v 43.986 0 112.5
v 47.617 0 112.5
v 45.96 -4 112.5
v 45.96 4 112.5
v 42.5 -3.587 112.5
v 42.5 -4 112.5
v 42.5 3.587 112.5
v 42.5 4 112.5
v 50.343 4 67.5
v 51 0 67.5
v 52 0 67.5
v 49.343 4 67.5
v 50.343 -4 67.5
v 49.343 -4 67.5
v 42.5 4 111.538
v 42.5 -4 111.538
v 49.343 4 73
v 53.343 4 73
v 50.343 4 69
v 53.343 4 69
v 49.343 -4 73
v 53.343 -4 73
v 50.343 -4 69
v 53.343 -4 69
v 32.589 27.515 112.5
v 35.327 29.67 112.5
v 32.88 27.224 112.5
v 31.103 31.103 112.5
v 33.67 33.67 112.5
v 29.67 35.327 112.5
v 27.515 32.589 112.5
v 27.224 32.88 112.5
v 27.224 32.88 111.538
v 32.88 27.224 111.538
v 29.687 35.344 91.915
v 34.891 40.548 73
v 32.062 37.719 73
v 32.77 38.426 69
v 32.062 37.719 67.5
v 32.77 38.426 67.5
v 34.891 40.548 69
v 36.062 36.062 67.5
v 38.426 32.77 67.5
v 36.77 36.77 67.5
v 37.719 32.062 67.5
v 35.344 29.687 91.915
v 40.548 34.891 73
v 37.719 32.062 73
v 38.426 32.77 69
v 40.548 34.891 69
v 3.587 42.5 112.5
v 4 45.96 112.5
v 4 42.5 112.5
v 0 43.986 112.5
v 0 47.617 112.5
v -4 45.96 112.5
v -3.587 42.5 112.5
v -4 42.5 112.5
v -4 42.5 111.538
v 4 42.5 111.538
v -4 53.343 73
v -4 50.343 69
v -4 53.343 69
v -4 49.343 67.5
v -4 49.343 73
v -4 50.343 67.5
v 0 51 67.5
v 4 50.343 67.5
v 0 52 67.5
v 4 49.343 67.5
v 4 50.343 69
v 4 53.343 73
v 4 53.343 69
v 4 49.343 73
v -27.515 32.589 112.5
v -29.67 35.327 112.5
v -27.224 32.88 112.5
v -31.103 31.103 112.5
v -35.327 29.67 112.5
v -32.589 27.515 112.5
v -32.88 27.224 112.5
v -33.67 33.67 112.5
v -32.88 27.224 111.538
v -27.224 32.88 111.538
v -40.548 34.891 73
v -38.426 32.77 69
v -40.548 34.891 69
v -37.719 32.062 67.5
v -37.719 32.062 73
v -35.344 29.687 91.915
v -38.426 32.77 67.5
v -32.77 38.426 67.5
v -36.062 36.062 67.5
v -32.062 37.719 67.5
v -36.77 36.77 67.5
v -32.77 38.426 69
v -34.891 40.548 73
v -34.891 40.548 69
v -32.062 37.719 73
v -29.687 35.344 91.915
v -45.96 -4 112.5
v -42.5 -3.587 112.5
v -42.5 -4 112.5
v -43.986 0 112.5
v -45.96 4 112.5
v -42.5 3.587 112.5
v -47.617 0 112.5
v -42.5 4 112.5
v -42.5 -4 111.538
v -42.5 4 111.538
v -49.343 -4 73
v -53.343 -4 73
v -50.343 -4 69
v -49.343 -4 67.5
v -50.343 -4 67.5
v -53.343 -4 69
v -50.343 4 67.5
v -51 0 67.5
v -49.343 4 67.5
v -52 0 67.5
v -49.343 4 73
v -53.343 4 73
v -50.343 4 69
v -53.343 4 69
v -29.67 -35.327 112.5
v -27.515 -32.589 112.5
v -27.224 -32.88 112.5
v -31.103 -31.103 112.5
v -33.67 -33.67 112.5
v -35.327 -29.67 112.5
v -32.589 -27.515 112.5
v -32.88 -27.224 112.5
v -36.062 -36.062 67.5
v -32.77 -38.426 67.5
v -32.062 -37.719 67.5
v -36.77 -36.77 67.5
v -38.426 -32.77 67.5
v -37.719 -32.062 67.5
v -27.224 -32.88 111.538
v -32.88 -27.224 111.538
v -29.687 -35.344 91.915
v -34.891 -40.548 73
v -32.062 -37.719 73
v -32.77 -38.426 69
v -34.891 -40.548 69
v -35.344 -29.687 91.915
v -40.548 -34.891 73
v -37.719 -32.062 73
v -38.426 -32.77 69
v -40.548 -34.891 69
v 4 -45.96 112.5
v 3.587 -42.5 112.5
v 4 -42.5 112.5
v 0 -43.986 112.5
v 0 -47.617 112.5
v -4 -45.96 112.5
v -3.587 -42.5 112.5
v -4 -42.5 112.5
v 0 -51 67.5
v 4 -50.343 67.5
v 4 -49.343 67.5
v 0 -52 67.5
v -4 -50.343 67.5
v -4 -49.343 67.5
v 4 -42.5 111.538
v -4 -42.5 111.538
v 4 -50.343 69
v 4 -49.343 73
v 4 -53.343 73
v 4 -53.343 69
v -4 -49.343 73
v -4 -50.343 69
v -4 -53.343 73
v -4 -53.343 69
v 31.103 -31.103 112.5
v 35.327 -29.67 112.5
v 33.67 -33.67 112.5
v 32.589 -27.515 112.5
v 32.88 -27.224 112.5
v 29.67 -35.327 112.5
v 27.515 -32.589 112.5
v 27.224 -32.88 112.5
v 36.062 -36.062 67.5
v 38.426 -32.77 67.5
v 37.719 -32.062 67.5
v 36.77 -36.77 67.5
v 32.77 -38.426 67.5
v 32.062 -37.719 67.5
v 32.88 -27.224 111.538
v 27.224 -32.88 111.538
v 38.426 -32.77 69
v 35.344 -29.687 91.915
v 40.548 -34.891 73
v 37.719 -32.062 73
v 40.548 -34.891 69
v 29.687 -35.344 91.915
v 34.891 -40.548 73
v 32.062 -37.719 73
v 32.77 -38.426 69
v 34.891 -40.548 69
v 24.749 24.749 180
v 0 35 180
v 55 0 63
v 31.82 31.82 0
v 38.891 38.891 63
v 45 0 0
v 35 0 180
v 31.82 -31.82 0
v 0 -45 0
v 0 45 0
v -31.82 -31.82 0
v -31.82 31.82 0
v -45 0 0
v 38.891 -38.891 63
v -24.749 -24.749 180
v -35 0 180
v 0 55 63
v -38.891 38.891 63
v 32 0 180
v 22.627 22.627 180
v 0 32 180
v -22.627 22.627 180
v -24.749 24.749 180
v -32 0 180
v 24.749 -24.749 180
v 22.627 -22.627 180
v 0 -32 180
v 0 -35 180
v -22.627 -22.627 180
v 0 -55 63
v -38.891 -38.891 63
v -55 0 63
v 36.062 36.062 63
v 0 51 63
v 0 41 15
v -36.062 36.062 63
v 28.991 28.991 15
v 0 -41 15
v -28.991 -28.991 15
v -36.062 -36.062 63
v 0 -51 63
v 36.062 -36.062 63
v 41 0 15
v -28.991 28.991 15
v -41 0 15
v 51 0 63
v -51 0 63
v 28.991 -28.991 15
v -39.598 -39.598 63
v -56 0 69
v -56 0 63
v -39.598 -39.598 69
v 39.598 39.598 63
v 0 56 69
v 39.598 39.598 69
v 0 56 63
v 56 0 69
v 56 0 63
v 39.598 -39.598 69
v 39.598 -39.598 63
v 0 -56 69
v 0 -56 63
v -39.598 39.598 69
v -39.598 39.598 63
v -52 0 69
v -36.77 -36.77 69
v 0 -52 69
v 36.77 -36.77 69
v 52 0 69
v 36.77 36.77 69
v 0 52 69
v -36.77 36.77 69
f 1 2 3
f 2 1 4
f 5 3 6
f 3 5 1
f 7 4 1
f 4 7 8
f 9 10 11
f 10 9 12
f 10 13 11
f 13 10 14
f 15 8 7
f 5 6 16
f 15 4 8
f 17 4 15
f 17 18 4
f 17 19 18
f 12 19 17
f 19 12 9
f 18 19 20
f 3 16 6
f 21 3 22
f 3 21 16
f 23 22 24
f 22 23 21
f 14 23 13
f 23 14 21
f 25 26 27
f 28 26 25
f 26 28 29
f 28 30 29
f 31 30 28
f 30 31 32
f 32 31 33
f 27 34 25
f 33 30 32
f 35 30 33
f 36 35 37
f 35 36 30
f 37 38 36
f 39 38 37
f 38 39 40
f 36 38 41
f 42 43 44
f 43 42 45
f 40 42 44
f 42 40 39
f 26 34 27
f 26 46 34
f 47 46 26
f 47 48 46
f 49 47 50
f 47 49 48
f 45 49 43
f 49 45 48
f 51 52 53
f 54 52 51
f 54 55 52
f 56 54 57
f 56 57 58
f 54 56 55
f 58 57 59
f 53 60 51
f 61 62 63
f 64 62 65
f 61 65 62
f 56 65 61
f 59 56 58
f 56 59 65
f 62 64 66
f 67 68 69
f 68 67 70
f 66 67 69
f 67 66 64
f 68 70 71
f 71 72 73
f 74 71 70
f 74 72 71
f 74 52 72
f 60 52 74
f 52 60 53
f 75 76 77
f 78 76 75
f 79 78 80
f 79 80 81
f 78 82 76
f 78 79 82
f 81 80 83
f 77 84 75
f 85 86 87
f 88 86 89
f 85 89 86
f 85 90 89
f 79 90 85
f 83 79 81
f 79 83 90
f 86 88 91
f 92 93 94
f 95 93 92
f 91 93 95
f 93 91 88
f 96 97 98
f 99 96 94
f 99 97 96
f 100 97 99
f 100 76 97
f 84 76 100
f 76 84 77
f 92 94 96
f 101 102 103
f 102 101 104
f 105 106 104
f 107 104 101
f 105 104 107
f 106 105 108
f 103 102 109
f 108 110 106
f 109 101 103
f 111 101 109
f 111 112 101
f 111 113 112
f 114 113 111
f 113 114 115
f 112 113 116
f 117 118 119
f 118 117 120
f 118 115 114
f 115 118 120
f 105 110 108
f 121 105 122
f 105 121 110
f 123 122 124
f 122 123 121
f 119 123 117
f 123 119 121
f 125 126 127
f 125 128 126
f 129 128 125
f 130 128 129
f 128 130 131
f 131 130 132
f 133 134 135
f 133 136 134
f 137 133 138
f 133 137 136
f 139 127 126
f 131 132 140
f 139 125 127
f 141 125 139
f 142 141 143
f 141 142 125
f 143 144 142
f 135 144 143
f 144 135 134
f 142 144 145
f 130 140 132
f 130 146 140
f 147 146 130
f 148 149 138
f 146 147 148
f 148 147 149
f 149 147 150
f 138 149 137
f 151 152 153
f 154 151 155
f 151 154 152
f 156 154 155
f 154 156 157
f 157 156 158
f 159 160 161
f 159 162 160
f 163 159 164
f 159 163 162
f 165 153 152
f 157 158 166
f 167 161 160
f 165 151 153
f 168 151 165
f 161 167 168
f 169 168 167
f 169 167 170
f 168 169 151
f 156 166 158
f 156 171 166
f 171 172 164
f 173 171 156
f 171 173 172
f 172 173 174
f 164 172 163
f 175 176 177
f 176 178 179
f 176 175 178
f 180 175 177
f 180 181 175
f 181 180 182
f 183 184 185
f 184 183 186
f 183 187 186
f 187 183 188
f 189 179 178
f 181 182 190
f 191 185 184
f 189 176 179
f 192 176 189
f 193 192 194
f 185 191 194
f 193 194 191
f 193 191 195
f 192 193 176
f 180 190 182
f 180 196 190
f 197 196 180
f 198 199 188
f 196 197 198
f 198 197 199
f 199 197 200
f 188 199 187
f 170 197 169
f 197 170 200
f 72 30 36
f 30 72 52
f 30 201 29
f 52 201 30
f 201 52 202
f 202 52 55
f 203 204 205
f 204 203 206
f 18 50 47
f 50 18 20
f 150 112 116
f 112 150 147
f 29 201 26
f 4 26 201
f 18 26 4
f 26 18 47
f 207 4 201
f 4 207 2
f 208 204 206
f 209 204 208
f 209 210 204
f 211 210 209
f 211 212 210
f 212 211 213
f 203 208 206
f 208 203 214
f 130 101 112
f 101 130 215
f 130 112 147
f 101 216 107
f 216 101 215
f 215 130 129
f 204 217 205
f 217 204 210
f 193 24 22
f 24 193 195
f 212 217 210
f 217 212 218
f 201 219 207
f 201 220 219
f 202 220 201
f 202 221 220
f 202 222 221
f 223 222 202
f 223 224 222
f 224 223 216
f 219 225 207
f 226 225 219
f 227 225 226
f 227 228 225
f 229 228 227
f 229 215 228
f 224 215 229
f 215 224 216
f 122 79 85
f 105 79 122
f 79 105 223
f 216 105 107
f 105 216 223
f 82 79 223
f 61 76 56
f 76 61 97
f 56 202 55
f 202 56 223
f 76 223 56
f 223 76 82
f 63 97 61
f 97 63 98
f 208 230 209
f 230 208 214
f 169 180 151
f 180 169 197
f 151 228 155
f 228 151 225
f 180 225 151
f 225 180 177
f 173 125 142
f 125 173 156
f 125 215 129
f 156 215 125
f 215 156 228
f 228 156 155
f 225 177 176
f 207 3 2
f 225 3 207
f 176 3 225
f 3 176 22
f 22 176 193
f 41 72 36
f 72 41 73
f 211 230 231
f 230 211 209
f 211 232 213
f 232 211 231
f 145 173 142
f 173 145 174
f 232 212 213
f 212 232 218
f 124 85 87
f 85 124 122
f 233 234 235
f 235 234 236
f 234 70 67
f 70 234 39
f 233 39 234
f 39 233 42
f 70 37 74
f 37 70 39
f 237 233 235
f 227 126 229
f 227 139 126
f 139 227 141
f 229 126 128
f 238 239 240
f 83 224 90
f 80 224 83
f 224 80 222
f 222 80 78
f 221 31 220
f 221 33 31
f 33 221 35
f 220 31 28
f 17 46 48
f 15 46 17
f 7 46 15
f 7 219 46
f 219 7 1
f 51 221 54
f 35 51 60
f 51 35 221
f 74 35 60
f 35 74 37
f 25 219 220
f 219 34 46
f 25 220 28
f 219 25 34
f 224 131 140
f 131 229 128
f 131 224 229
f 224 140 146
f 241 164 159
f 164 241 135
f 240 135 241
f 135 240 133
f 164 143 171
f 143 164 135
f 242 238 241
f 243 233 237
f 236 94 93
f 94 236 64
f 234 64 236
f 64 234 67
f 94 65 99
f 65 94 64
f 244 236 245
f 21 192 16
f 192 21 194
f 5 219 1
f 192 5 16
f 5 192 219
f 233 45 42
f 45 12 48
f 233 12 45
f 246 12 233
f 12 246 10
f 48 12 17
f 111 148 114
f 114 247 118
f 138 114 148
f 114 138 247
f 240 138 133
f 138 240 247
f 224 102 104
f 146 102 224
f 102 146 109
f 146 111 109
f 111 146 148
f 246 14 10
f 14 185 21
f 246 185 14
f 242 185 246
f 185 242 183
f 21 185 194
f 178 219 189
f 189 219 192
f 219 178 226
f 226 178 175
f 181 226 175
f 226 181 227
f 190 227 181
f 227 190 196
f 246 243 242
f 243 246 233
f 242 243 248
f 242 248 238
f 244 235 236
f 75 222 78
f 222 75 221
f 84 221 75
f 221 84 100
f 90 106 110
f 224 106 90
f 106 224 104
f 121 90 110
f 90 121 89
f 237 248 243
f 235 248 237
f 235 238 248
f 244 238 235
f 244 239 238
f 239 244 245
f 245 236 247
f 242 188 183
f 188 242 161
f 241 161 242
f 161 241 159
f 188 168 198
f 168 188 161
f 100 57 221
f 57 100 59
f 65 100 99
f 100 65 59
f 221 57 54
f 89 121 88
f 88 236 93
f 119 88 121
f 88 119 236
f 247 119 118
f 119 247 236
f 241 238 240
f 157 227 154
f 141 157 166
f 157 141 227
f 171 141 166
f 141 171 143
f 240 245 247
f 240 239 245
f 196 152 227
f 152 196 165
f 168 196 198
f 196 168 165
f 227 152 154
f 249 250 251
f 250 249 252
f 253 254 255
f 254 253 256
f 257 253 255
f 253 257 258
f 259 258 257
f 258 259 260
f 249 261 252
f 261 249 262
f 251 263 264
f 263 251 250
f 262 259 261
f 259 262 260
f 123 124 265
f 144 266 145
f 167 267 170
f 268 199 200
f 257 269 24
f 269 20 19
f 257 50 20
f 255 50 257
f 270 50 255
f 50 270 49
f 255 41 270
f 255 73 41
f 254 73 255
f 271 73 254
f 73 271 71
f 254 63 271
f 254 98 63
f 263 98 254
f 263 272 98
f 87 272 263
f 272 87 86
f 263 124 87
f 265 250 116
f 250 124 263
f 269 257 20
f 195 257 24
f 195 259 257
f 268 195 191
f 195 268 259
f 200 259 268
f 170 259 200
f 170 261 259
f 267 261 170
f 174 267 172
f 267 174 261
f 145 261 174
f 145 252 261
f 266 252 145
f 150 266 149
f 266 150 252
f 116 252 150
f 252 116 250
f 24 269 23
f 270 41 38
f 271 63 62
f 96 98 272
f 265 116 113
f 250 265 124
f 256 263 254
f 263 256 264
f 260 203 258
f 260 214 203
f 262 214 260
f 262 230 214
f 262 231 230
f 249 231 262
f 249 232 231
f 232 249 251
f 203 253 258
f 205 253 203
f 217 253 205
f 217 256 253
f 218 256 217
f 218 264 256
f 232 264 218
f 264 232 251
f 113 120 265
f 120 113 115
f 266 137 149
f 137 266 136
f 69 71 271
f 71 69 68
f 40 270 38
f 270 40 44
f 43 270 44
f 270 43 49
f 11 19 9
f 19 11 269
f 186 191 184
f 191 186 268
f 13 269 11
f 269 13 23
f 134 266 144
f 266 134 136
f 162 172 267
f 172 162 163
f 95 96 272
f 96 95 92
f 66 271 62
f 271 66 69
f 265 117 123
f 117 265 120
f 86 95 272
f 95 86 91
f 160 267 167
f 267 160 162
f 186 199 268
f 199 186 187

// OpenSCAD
// Vase Variant - Squared Profile with Geometric Pattern
// Distinctive angular silhouette with cutout pattern

$fa = 2;
$fs = 0.4;

// Parameters
vase_height = 180;
base_diameter = 90;
belly_diameter = 110;
neck_diameter = 55;
rim_diameter = 70;
wall_thickness = 4;
base_height = 15;

// Squared profile with chamfered corners
module vase_variant() {
    difference() {
        // Outer shell
        hull() {
            // Base ring
            translate([0, 0, 0])
                cylinder(h = base_height, r = base_diameter / 2, $fn = 8);
            
            // Belly (widest point at 35% height)
            translate([0, 0, vase_height * 0.35])
                cylinder(h = 10, r = belly_diameter / 2, $fn = 8);
            
            // Neck transition
            translate([0, 0, vase_height * 0.75])
                cylinder(h = 10, r = neck_diameter / 2, $fn = 8);
            
            // Rim
            translate([0, 0, vase_height - 2])
                cylinder(h = 2, r = rim_diameter / 2, $fn = 8);
        }
        
        // Inner cavity
        translate([0, 0, base_height]) {
            hull() {
                // Cavity starts above base
                translate([0, 0, 0])
                    cylinder(h = 5, r = (base_diameter / 2) - wall_thickness, $fn = 8);
                
                // Belly cavity
                translate([0, 0, (vase_height * 0.35) - base_height])
                    cylinder(h = 10, r = (belly_diameter / 2) - wall_thickness, $fn = 8);
                
                // Neck cavity
                translate([0, 0, (vase_height * 0.75) - base_height])
                    cylinder(h = 10, r = (neck_diameter / 2) - wall_thickness + 1, $fn = 8);
                
                // Rim cavity
                translate([0, 0, vase_height - base_height - 5])
                    cylinder(h = 5, r = (rim_diameter / 2) - wall_thickness + 1, $fn = 8);
            }
        }
        
        // Decorative cutouts - vertical slots
        for (i = [0:7]) {
            rotate([0, 0, i * 45])
                translate([belly_diameter / 2 - wall_thickness - 1, 0, vase_height * 0.5])
                    cube([15, 8, vase_height * 0.25], center = true);
        }
    }
    
    // Decorative band at belly
    translate([0, 0, vase_height * 0.35]) {
        difference() {
            cylinder(h = 6, r = belly_diameter / 2 + 1, $fn = 8);
            cylinder(h = 6.5, r = belly_diameter / 2 - wall_thickness + 1, $fn = 8);
        }
    }
}

// Top-level invocation for standalone render
vase_variant();
